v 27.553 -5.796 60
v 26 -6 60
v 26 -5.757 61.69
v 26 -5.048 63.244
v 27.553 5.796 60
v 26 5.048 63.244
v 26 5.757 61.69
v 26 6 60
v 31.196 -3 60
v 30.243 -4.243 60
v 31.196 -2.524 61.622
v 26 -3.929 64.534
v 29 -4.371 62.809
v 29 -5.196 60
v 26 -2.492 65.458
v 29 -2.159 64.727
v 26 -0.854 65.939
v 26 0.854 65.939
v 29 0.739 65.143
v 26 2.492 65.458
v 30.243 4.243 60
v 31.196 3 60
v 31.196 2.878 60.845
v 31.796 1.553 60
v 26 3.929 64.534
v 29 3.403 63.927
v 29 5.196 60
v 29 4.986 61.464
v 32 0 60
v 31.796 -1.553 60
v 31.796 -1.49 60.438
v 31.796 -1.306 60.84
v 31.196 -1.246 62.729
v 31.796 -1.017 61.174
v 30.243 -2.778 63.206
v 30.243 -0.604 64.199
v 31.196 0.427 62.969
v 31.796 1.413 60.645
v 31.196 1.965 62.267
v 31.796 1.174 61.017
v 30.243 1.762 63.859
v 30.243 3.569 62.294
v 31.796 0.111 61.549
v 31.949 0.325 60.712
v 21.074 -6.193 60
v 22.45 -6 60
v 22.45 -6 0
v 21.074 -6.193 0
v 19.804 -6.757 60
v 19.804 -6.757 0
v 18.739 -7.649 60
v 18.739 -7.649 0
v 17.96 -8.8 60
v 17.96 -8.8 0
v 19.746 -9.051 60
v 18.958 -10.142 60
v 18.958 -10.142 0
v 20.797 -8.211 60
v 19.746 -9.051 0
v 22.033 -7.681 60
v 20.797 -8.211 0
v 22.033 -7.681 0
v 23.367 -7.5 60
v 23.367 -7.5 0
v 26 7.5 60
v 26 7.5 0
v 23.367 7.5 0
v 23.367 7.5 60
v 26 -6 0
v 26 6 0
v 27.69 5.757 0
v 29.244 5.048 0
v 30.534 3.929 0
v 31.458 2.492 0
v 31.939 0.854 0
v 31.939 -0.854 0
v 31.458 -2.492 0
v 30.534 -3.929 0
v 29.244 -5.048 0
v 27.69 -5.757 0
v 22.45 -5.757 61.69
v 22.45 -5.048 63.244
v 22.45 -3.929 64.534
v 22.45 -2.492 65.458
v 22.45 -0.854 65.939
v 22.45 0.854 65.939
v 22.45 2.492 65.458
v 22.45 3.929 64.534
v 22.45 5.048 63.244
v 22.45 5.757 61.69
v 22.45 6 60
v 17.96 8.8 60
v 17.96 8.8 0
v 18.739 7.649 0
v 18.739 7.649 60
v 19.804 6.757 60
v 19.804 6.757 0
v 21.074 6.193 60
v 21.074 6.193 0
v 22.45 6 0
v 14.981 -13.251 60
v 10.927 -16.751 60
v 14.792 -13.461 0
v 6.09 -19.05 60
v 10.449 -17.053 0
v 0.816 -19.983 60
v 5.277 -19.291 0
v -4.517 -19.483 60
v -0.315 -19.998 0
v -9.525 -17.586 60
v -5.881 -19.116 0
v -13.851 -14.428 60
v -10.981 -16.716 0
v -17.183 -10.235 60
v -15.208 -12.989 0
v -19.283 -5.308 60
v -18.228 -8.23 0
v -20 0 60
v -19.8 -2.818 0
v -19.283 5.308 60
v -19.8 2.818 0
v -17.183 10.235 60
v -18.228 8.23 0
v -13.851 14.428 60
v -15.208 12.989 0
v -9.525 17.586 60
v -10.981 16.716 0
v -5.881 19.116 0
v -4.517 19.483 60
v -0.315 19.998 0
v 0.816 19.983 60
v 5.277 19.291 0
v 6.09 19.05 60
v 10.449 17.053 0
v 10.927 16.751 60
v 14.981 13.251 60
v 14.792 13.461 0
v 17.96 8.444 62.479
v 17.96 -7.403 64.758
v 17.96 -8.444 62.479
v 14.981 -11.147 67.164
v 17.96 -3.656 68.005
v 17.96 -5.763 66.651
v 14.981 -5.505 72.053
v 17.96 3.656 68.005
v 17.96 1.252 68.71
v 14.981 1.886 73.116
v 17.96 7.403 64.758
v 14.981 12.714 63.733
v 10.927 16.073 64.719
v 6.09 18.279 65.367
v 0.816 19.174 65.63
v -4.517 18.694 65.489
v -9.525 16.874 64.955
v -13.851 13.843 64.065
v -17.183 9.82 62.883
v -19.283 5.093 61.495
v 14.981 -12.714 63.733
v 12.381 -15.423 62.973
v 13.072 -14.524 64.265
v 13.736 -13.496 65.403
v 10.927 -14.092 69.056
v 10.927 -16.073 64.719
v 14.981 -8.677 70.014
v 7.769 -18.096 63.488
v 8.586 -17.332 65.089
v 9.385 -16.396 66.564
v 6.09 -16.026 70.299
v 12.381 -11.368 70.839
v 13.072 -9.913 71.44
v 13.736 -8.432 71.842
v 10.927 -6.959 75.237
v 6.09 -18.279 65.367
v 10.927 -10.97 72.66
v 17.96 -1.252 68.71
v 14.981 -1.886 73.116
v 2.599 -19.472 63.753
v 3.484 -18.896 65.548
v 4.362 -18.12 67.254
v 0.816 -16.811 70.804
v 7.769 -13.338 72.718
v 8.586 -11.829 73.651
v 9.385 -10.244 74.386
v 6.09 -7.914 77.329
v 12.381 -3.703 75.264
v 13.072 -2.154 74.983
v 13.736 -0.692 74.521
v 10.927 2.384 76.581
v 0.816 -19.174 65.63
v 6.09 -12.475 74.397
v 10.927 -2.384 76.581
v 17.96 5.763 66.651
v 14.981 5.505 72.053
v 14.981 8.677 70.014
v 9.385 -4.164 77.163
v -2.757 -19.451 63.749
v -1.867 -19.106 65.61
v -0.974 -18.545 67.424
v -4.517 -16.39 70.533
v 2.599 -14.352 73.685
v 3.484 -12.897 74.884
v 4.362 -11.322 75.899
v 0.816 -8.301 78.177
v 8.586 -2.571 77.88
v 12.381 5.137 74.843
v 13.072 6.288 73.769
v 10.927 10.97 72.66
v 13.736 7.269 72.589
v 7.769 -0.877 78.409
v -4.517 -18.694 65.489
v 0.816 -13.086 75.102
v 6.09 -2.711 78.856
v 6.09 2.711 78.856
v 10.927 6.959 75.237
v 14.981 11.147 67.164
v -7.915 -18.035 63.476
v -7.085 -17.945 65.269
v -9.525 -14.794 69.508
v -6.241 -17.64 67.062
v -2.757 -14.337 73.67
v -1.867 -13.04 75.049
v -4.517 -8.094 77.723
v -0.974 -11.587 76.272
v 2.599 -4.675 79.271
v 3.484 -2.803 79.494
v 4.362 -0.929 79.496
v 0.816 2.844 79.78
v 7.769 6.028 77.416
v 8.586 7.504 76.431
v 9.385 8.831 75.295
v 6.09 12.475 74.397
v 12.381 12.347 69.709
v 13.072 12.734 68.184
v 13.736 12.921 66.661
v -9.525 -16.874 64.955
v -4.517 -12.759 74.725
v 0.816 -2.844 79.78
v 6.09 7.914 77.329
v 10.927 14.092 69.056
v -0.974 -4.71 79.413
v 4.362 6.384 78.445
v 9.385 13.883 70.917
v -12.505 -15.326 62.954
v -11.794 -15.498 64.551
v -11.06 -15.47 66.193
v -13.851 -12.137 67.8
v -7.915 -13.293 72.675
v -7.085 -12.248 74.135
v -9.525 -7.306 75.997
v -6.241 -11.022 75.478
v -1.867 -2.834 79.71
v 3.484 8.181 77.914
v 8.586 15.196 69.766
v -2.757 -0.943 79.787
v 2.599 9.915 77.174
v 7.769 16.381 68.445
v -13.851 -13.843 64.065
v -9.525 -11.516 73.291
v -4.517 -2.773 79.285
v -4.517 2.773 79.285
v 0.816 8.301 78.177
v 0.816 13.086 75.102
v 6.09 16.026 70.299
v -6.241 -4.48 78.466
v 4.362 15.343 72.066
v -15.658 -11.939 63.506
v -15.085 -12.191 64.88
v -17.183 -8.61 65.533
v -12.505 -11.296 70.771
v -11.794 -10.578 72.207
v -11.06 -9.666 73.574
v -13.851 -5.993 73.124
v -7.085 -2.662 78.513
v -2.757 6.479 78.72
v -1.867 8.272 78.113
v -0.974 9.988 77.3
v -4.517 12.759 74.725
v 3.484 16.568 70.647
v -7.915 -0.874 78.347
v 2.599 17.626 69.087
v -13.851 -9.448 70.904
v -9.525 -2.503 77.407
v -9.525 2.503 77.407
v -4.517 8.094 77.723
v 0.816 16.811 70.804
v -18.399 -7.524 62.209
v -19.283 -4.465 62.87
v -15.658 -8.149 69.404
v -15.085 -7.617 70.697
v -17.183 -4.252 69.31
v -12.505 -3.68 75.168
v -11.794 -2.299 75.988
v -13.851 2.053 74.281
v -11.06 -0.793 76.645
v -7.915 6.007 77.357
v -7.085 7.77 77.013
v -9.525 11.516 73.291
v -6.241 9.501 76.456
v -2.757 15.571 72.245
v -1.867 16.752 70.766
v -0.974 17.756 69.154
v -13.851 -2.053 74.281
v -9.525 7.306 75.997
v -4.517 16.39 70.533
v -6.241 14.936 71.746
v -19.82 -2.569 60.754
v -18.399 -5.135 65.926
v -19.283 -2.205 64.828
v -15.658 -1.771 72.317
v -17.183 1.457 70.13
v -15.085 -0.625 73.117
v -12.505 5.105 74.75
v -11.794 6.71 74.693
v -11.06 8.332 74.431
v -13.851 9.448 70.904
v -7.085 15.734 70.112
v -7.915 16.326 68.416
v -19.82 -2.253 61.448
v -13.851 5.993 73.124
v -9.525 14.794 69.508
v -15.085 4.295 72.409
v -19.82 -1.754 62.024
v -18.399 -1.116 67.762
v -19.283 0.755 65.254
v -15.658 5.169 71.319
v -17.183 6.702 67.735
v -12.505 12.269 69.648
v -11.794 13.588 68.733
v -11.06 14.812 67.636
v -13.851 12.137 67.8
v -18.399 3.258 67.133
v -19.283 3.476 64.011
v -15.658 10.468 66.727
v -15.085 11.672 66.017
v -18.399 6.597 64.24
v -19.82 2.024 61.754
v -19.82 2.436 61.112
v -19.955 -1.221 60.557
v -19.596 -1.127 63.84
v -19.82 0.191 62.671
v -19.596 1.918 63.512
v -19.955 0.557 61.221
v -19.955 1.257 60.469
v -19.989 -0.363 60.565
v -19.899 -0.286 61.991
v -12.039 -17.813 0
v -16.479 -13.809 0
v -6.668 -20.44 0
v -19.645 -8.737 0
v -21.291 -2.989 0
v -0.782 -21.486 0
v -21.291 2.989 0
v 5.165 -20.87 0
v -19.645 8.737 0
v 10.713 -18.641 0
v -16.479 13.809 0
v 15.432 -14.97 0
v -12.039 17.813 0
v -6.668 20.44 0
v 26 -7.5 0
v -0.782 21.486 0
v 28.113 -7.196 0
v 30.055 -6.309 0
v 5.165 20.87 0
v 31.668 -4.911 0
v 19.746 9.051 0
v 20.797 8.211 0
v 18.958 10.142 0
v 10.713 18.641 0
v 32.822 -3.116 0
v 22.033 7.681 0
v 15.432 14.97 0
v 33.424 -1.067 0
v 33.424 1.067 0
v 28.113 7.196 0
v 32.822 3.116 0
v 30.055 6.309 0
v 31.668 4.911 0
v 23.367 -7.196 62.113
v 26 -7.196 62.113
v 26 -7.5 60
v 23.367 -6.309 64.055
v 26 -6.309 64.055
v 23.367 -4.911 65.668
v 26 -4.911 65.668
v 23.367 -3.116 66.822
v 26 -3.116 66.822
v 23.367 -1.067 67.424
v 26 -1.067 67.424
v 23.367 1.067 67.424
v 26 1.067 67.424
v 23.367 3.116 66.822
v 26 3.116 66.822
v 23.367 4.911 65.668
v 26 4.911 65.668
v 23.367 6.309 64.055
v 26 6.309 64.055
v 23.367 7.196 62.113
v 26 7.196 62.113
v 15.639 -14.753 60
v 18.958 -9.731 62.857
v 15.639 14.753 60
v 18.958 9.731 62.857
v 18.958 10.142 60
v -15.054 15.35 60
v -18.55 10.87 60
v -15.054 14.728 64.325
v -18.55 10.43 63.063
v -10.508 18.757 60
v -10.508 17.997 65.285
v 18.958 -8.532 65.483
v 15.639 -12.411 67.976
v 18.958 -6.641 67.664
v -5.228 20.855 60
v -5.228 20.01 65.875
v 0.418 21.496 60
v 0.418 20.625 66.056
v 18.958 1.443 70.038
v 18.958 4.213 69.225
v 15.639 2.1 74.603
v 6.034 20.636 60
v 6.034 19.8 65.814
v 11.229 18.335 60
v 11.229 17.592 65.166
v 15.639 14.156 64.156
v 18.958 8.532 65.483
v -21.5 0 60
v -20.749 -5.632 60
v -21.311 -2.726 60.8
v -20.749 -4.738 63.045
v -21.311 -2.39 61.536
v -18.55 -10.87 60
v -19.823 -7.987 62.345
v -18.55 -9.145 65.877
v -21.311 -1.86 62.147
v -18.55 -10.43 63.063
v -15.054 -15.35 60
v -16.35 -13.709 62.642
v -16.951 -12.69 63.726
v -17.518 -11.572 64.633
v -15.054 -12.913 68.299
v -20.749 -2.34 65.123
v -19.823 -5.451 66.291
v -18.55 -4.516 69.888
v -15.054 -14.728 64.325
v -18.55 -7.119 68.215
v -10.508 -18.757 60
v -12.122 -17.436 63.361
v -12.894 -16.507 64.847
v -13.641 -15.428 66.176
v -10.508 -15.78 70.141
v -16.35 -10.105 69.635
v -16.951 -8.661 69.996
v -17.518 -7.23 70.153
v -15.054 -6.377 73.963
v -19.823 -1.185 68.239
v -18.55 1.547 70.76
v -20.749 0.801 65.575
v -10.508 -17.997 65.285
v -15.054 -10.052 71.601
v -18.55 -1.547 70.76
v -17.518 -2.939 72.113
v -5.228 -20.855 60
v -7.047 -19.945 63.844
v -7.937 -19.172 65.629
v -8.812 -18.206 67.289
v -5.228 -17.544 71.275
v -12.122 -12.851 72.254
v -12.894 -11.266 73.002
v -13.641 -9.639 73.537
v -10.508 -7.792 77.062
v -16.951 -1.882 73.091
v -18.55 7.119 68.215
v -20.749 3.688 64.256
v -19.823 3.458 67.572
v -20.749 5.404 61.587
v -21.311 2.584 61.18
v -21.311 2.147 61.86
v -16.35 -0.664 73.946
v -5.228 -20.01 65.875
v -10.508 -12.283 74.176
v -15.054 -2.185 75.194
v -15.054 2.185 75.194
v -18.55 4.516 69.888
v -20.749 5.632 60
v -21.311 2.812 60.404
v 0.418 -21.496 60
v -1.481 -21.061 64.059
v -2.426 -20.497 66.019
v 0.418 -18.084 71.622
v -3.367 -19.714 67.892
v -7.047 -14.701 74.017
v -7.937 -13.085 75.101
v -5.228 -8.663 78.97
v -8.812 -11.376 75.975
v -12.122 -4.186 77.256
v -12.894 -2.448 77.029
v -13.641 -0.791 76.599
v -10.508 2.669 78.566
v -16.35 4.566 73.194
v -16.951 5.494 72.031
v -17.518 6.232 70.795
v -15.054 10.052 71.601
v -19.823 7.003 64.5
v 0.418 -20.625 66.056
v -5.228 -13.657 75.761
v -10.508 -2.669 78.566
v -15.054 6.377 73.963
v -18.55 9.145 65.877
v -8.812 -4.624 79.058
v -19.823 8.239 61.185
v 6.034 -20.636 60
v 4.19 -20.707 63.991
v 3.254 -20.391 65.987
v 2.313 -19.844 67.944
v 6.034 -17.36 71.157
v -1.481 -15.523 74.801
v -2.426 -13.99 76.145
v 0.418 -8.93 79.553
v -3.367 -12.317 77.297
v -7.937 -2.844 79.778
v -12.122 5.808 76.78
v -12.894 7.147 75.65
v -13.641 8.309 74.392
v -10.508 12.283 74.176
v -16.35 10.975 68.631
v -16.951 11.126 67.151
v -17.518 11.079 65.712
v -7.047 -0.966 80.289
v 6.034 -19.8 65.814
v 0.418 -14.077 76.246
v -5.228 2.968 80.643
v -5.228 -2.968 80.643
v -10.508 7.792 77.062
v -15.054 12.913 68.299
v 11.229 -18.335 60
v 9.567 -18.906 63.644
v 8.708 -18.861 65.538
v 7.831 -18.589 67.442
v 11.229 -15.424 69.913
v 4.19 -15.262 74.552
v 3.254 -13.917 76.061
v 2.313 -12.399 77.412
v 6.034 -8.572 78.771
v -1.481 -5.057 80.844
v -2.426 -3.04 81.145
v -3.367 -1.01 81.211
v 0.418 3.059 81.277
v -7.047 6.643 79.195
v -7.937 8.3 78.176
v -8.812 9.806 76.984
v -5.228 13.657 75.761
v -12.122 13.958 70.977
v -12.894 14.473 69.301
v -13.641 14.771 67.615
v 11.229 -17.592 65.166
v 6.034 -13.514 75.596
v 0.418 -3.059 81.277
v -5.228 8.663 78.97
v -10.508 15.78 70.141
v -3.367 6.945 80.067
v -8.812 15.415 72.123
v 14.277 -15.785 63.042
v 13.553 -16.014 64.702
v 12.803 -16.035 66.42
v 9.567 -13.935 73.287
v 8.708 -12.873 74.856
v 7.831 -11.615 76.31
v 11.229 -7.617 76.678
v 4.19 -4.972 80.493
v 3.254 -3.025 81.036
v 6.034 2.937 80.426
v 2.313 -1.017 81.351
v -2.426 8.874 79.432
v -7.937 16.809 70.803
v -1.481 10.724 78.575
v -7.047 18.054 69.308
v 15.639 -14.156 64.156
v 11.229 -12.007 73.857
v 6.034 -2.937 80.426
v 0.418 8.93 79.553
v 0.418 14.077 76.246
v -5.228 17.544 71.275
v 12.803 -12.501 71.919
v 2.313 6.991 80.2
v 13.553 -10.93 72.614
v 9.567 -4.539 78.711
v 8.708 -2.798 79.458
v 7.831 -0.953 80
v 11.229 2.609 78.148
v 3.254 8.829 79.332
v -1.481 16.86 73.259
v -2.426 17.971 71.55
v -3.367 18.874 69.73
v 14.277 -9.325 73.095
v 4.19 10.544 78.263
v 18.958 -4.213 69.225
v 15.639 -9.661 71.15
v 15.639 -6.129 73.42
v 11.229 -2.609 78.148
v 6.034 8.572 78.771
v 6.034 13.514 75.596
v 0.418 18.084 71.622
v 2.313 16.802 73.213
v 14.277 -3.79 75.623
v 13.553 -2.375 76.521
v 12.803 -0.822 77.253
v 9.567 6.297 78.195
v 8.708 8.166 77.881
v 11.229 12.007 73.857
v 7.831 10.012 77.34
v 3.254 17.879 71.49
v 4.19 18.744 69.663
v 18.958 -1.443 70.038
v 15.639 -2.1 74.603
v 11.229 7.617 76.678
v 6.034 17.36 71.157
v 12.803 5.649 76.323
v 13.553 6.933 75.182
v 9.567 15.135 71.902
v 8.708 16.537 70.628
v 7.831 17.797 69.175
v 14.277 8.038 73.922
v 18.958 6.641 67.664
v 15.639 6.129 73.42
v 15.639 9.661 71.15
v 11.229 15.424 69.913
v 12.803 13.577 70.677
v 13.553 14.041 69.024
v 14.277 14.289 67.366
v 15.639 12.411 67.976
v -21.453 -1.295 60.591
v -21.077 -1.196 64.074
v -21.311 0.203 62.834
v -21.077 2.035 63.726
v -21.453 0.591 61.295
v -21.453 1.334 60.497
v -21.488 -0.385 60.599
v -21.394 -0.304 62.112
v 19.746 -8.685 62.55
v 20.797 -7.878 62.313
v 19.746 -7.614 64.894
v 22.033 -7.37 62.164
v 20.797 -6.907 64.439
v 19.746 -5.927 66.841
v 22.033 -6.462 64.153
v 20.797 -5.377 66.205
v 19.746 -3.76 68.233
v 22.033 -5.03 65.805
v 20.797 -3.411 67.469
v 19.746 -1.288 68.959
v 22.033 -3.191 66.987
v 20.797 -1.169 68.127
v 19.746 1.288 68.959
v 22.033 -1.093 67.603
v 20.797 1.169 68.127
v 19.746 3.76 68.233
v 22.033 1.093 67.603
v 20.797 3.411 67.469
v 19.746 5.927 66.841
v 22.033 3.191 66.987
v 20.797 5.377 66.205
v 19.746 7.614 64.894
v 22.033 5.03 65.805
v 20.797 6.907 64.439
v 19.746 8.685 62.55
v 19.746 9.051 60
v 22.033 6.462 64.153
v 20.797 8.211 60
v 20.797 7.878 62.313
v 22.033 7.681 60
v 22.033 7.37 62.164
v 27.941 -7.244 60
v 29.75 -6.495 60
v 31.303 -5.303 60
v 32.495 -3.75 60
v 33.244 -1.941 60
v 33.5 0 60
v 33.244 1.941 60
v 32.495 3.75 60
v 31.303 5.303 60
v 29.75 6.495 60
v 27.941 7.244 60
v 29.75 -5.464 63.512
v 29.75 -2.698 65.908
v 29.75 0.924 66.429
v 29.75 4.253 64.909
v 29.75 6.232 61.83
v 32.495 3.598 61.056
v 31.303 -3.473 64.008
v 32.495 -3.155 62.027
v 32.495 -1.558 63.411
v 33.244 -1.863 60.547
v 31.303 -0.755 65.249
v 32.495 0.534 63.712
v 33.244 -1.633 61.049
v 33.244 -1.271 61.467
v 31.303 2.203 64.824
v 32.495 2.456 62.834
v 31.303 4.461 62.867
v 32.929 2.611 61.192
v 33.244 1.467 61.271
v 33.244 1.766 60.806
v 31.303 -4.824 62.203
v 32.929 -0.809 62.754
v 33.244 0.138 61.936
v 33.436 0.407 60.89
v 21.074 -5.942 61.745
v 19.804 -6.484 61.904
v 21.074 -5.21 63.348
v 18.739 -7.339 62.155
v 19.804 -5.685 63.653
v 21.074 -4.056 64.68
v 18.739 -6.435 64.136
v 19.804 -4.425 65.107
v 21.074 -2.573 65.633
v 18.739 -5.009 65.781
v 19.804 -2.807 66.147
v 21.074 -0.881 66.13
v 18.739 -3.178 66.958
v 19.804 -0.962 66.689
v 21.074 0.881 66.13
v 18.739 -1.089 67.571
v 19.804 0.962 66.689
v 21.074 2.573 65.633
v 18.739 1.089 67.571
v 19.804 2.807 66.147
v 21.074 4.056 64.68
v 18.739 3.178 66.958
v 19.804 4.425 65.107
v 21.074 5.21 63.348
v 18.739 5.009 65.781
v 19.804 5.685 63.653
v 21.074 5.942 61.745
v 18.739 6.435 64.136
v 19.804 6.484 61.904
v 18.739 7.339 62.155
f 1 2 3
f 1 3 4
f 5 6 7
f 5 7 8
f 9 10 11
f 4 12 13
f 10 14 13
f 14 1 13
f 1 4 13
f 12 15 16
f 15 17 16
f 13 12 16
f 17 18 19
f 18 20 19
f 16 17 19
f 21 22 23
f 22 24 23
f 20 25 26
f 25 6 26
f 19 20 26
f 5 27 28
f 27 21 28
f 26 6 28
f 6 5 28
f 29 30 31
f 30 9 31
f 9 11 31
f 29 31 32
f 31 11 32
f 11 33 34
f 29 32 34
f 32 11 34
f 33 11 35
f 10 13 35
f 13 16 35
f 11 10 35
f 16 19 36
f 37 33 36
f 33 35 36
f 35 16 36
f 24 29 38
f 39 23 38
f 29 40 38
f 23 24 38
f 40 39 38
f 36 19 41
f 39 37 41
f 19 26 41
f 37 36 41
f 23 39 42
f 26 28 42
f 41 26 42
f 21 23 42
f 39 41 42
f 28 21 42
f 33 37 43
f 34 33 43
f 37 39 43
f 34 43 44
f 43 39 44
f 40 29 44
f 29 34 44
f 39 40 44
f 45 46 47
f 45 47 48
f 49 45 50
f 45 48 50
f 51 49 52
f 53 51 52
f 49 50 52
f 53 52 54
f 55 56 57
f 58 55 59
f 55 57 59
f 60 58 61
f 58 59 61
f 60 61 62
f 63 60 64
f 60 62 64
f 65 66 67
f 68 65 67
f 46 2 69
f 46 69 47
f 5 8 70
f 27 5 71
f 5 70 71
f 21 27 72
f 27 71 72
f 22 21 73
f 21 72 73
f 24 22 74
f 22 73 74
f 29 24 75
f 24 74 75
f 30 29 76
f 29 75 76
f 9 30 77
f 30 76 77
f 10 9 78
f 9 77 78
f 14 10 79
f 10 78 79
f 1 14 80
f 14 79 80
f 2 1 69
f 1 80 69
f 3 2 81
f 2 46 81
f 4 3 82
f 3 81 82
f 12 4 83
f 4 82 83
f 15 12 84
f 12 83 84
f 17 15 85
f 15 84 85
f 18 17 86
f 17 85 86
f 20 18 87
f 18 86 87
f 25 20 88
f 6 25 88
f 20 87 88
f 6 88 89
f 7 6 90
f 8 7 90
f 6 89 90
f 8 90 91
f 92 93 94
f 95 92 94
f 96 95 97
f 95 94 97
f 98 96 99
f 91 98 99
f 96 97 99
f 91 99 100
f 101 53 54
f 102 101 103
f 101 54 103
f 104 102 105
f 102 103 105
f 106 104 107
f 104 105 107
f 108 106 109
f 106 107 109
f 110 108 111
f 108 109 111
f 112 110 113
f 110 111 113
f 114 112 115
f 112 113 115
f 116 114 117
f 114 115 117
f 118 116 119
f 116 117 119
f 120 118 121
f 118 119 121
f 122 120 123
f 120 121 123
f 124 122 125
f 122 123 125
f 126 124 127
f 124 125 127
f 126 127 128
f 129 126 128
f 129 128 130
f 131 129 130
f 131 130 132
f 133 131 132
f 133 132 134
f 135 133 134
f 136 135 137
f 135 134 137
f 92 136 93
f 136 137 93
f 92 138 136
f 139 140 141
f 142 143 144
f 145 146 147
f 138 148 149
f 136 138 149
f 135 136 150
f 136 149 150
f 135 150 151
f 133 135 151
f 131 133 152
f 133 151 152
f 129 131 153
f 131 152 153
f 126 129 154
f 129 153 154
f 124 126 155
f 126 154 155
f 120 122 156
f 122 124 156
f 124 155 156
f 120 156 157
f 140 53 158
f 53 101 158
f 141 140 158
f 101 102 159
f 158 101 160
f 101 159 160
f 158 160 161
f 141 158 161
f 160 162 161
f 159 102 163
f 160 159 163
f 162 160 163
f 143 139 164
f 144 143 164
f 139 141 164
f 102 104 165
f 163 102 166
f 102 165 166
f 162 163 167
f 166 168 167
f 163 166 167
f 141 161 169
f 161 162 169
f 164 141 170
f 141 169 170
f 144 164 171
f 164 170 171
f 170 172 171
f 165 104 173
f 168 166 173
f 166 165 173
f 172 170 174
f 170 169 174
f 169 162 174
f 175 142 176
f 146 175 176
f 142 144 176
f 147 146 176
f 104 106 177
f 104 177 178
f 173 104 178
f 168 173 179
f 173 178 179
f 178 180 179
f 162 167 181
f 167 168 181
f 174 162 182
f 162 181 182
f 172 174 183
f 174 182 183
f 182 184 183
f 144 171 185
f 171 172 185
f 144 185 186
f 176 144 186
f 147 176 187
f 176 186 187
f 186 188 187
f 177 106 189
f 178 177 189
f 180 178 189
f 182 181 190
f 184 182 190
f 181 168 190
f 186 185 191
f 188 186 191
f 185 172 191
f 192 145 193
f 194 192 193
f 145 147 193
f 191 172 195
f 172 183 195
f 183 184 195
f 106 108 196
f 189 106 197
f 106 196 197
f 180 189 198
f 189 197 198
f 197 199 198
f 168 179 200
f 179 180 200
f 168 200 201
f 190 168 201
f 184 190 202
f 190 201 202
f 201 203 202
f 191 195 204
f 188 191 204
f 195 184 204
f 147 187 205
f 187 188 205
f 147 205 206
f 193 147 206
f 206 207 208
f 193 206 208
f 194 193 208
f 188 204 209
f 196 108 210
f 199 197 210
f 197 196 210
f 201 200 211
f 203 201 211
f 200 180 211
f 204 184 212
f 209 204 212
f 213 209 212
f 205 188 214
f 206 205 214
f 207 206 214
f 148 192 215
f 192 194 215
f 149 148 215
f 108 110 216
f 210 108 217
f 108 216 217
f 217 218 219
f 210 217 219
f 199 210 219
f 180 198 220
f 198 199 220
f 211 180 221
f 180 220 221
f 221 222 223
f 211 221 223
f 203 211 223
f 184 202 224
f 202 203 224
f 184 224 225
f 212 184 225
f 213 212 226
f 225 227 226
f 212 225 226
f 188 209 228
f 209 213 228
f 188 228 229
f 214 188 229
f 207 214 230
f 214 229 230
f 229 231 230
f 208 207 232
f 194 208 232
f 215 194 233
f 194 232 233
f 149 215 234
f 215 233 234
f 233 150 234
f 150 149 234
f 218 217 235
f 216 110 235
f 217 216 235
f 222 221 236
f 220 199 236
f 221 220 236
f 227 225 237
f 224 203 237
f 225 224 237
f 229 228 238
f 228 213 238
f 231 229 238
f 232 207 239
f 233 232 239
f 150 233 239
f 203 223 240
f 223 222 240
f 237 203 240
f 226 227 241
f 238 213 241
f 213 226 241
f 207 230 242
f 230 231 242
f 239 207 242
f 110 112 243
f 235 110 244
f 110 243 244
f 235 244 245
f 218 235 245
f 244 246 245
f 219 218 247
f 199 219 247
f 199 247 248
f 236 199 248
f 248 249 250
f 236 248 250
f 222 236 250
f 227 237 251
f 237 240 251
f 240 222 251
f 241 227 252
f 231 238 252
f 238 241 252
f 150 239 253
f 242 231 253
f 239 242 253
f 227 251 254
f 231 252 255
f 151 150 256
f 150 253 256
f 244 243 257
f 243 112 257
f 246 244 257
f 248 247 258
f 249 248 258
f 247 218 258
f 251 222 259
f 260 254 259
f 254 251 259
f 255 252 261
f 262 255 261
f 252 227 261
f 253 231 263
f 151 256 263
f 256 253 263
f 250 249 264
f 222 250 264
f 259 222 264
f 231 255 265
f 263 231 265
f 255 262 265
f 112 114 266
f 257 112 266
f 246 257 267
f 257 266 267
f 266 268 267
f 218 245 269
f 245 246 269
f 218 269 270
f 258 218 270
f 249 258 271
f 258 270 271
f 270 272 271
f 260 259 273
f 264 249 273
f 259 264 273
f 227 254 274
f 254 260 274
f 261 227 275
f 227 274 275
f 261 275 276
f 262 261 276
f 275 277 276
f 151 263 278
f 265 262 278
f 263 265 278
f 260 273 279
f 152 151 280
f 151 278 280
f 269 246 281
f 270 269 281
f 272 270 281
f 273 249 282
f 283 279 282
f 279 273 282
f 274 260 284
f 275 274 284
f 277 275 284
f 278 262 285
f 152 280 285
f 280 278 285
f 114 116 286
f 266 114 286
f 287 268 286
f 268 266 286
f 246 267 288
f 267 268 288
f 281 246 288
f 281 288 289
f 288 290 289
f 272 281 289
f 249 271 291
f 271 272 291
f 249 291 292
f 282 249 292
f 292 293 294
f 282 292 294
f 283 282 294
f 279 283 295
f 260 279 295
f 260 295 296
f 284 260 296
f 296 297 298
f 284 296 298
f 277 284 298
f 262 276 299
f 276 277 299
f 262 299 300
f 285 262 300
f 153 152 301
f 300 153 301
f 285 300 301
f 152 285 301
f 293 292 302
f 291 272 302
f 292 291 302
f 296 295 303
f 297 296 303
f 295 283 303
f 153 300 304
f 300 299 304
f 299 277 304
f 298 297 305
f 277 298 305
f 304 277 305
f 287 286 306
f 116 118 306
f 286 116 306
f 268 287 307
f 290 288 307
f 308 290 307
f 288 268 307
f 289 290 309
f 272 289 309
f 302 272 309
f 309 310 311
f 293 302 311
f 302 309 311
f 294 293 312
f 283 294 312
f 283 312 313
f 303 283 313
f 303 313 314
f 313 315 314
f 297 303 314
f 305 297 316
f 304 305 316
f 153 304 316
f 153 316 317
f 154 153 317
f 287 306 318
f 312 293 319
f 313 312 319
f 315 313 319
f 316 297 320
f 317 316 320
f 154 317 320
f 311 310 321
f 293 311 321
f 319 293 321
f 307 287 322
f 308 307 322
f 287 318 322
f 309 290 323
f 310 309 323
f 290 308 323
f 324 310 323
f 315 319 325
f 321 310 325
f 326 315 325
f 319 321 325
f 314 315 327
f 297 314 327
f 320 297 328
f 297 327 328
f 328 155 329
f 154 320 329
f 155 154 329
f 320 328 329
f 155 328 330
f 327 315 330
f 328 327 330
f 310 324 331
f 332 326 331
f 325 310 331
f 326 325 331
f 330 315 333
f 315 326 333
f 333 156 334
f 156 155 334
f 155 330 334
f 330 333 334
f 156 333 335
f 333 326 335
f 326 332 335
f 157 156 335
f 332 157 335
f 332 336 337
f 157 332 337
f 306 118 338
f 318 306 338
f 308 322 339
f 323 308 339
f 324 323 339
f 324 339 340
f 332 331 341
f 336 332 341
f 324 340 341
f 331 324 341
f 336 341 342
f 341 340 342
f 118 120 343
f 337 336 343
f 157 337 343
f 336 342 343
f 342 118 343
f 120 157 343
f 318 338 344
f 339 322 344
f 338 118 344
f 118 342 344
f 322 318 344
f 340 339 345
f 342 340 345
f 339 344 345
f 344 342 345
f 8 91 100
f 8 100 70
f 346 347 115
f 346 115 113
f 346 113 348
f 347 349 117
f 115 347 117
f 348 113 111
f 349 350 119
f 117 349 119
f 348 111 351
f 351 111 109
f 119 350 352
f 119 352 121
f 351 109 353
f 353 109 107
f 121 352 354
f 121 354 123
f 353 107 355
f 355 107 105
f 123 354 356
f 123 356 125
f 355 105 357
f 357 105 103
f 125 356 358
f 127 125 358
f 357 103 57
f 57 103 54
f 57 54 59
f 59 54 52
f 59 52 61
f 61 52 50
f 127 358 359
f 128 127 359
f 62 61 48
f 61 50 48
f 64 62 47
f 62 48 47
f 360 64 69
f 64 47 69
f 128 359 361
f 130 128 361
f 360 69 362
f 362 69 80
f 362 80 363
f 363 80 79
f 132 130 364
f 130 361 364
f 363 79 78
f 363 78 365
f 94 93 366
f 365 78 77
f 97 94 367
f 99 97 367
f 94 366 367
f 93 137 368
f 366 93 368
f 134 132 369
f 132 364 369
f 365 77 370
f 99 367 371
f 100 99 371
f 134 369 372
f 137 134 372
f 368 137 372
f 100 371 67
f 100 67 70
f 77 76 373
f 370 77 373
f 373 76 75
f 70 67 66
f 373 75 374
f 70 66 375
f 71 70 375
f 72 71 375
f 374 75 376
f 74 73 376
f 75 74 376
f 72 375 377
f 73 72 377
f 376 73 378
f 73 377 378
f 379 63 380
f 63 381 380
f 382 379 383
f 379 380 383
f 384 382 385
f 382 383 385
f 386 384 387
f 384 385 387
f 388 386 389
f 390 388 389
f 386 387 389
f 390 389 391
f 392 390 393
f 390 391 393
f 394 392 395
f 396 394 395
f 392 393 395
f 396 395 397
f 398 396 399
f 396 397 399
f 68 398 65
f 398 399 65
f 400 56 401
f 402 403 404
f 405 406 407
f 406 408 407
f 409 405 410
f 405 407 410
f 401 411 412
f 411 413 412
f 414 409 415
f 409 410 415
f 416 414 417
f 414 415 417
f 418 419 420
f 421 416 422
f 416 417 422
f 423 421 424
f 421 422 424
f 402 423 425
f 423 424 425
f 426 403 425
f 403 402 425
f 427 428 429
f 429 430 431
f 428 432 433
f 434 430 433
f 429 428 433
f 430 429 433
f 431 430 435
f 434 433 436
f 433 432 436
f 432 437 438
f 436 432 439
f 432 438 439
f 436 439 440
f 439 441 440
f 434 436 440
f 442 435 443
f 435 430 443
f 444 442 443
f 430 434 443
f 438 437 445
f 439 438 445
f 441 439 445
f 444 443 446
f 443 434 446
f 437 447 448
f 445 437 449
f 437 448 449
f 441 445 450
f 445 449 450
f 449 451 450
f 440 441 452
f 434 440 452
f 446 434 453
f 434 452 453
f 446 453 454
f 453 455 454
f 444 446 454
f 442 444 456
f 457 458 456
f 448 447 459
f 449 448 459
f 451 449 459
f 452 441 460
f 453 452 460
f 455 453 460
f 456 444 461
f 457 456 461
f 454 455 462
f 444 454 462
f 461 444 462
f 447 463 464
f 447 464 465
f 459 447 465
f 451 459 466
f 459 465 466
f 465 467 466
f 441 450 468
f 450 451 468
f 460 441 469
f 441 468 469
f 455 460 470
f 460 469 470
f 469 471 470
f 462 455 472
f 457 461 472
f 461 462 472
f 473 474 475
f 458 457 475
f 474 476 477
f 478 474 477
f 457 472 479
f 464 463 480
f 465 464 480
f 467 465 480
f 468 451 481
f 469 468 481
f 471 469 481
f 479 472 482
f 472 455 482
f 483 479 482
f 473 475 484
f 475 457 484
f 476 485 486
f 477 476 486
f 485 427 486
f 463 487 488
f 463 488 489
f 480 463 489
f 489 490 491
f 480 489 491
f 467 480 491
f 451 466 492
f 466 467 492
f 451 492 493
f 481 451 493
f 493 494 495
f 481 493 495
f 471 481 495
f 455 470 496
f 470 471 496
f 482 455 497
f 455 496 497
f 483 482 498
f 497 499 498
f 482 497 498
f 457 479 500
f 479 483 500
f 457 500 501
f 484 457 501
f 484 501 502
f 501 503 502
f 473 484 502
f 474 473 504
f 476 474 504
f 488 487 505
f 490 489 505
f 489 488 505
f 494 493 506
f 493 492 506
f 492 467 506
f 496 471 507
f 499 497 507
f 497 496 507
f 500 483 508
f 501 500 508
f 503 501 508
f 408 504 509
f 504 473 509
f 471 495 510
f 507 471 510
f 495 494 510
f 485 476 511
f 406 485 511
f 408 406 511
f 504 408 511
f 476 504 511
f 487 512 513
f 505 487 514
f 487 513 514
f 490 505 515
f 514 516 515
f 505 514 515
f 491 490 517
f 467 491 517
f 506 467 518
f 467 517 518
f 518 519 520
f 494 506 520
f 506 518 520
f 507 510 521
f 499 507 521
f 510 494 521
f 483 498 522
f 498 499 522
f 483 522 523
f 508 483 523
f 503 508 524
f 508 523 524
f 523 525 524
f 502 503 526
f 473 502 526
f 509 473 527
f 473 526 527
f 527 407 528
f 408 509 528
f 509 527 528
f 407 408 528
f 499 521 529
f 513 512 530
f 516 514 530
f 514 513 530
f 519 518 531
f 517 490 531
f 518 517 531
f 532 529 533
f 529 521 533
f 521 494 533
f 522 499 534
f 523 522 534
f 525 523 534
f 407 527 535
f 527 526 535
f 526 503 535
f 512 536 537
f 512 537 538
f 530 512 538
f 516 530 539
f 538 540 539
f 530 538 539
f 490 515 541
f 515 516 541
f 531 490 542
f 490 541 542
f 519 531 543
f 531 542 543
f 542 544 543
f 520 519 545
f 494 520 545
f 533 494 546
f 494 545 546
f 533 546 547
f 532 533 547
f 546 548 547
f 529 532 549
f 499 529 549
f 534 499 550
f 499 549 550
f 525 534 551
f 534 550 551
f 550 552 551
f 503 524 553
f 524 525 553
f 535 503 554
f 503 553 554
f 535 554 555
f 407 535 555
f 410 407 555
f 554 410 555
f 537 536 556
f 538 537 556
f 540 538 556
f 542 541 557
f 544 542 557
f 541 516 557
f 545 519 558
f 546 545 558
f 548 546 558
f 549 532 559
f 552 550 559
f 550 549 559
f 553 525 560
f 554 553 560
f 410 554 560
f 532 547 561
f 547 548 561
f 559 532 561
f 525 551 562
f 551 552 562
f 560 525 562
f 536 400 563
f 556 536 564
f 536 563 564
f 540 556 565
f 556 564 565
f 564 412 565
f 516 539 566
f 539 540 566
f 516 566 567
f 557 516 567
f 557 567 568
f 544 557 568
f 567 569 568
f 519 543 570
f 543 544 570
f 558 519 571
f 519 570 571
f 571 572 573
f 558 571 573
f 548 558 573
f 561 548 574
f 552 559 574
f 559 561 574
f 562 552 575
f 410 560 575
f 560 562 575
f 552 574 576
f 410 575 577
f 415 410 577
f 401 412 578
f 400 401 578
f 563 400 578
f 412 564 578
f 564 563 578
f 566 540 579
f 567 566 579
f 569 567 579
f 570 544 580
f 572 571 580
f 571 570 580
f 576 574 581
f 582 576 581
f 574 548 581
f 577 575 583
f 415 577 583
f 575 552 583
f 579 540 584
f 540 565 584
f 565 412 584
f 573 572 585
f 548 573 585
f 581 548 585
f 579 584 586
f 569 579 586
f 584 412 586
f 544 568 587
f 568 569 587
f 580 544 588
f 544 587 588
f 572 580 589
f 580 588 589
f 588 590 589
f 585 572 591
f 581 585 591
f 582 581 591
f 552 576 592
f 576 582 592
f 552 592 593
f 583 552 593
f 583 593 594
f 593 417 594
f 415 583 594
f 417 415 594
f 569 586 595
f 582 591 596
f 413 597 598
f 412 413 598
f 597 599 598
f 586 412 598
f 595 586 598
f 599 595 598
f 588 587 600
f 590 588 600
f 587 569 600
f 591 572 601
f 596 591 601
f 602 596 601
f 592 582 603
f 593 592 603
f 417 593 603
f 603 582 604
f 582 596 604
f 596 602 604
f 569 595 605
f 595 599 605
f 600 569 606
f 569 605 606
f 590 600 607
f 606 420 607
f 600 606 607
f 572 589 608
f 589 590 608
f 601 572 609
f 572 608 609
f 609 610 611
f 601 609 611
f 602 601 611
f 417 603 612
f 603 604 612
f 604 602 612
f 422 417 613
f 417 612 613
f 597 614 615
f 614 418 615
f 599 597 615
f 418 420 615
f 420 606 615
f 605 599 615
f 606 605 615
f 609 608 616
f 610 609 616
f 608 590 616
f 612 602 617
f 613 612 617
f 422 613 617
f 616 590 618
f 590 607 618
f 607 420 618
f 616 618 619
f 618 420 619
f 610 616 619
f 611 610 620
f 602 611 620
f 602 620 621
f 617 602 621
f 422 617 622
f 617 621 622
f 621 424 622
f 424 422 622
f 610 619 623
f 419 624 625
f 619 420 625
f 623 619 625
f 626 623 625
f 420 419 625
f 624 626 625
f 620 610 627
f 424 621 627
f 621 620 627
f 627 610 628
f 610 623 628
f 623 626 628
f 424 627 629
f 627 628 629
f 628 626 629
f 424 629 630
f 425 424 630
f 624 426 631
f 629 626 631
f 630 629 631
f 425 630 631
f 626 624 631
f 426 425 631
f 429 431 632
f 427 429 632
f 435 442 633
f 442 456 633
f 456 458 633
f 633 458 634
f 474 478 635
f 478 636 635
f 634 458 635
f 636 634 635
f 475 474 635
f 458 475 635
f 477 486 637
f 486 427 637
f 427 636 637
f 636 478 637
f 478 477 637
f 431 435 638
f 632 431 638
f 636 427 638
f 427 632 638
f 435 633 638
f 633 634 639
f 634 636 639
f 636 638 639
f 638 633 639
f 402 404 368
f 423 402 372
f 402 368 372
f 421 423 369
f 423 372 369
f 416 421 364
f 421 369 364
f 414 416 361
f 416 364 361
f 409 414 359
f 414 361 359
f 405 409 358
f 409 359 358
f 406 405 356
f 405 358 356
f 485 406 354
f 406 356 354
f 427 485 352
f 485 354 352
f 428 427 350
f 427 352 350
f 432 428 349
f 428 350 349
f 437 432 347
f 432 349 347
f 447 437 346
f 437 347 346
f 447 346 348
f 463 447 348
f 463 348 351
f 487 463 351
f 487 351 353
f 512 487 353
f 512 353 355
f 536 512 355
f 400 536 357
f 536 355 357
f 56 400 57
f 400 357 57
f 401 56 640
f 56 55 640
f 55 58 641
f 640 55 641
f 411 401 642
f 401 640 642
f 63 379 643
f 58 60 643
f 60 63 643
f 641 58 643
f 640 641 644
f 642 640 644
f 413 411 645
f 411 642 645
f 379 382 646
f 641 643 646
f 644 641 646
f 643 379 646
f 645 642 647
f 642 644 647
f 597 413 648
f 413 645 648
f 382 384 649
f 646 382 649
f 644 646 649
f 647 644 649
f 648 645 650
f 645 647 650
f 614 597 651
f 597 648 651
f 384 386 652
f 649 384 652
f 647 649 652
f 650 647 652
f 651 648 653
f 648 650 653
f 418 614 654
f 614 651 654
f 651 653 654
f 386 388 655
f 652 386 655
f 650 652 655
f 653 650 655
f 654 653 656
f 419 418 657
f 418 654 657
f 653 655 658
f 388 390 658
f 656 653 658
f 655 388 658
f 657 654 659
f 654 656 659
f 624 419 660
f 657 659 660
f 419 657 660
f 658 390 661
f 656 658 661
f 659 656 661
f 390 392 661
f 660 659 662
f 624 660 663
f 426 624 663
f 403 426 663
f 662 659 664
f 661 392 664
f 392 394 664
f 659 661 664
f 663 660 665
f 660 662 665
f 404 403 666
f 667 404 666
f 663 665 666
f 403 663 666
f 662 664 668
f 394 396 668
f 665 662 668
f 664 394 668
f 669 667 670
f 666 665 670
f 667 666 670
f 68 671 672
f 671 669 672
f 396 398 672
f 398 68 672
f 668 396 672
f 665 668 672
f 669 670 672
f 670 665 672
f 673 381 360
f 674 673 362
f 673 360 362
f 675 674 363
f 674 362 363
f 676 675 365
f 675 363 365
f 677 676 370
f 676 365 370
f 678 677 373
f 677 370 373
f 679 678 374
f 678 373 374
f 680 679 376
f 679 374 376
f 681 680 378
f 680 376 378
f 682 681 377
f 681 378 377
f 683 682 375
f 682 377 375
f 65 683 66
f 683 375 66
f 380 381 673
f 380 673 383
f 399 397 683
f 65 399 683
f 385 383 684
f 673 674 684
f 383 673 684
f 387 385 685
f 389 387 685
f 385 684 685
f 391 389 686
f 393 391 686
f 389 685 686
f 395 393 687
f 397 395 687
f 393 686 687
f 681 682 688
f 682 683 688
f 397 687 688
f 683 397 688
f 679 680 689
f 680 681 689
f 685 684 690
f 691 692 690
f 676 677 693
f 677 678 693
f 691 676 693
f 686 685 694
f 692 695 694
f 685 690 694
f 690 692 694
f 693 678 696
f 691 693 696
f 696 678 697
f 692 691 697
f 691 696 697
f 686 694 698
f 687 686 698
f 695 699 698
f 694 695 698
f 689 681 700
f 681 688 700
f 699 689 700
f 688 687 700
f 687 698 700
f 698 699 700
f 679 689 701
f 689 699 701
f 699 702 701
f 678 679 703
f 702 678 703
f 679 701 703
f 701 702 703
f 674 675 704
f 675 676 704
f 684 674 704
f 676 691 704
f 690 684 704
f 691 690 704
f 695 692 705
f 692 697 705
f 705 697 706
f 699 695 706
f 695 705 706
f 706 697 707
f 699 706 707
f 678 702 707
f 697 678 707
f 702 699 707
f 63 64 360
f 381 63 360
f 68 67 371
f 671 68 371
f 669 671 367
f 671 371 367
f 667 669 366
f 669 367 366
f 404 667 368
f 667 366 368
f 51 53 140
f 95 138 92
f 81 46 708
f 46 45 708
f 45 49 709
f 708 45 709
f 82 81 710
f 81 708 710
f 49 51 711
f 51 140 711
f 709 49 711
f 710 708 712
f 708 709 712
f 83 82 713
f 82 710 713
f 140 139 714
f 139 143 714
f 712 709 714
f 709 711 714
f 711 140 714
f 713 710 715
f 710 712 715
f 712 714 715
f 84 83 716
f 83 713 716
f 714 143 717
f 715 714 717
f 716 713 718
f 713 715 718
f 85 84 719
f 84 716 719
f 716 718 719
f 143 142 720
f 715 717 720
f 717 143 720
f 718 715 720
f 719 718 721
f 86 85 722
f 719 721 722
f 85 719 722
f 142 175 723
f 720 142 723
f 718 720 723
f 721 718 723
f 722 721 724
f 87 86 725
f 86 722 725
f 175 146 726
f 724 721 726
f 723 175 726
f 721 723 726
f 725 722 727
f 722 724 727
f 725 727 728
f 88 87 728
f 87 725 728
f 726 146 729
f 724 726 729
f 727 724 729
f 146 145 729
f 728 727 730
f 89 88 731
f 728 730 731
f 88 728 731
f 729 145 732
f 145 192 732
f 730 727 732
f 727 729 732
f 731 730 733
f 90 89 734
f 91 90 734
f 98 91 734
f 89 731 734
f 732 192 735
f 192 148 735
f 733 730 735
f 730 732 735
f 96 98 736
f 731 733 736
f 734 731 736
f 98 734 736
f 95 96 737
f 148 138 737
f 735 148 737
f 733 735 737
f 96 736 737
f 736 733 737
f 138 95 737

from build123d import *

# Parameters (mm, degrees)
F1_DEPTH = 60
F4_ANGLE = -180


with BuildPart() as f1:
    # F0 (on Top) → F1 (new body)
    with BuildSketch(Plane.XY):
        with BuildLine():
            ThreePointArc((23.366643, 7.5), (20.796862, 8.210918), (18.957842, 10.141509))
            ThreePointArc((18.957842, 10.141509), (-21.5, 0), (18.957842, -10.141509))
            ThreePointArc((18.957842, -10.141509), (20.796862, -8.210918), (23.366643, -7.5))
            Line((23.366643, -7.5), (26, -7.5))
            ThreePointArc((26, -7.5), (33.5, 0), (26, 7.5))
            Line((26, 7.5), (23.366643, 7.5))
        make_face()
        with BuildLine():
            ThreePointArc((17.959955, -8.8), (-20, 0), (17.959955, 8.8))
            ThreePointArc((17.959955, 8.8), (19.804193, 6.757359), (22.449944, 6))
            Line((22.449944, 6), (26, 6))
            ThreePointArc((26, 6), (32, 0), (26, -6))
            Line((26, -6), (22.449944, -6))
            ThreePointArc((22.449944, -6), (19.804193, -6.757359), (17.959955, -8.8))
        make_face(mode=Mode.SUBTRACT)
    extrude(amount=F1_DEPTH)

    # F3 (on offset) → F4 (revolve)
    with BuildSketch(Plane.XY.offset(60)):
        with BuildLine():
            ThreePointArc((17.959955, -8.8), (-4.516685, -19.483315), (-20, 0))
            Line((-20, 0), (-21.5, 0))
            ThreePointArc((-21.5, 0), (-5.227638, -20.854779), (18.957842, -10.141509))
            ThreePointArc((18.957842, -10.141509), (20.796862, -8.210918), (23.366643, -7.5))
            Line((23.366643, -7.5), (26, -7.5))
            ThreePointArc((26, -7.5), (31.303301, -5.303301), (33.5, 0))
            Line((33.5, 0), (32, 0))
            ThreePointArc((32, 0), (30.242641, -4.242641), (26, -6))
            Line((26, -6), (22.449944, -6))
            ThreePointArc((22.449944, -6), (19.804193, -6.757359), (17.959955, -8.8))
        make_face()
    revolve(axis=Axis((6, 0, 60), (1, 0, 0)), revolution_arc=F4_ANGLE)


solid = f1.part
